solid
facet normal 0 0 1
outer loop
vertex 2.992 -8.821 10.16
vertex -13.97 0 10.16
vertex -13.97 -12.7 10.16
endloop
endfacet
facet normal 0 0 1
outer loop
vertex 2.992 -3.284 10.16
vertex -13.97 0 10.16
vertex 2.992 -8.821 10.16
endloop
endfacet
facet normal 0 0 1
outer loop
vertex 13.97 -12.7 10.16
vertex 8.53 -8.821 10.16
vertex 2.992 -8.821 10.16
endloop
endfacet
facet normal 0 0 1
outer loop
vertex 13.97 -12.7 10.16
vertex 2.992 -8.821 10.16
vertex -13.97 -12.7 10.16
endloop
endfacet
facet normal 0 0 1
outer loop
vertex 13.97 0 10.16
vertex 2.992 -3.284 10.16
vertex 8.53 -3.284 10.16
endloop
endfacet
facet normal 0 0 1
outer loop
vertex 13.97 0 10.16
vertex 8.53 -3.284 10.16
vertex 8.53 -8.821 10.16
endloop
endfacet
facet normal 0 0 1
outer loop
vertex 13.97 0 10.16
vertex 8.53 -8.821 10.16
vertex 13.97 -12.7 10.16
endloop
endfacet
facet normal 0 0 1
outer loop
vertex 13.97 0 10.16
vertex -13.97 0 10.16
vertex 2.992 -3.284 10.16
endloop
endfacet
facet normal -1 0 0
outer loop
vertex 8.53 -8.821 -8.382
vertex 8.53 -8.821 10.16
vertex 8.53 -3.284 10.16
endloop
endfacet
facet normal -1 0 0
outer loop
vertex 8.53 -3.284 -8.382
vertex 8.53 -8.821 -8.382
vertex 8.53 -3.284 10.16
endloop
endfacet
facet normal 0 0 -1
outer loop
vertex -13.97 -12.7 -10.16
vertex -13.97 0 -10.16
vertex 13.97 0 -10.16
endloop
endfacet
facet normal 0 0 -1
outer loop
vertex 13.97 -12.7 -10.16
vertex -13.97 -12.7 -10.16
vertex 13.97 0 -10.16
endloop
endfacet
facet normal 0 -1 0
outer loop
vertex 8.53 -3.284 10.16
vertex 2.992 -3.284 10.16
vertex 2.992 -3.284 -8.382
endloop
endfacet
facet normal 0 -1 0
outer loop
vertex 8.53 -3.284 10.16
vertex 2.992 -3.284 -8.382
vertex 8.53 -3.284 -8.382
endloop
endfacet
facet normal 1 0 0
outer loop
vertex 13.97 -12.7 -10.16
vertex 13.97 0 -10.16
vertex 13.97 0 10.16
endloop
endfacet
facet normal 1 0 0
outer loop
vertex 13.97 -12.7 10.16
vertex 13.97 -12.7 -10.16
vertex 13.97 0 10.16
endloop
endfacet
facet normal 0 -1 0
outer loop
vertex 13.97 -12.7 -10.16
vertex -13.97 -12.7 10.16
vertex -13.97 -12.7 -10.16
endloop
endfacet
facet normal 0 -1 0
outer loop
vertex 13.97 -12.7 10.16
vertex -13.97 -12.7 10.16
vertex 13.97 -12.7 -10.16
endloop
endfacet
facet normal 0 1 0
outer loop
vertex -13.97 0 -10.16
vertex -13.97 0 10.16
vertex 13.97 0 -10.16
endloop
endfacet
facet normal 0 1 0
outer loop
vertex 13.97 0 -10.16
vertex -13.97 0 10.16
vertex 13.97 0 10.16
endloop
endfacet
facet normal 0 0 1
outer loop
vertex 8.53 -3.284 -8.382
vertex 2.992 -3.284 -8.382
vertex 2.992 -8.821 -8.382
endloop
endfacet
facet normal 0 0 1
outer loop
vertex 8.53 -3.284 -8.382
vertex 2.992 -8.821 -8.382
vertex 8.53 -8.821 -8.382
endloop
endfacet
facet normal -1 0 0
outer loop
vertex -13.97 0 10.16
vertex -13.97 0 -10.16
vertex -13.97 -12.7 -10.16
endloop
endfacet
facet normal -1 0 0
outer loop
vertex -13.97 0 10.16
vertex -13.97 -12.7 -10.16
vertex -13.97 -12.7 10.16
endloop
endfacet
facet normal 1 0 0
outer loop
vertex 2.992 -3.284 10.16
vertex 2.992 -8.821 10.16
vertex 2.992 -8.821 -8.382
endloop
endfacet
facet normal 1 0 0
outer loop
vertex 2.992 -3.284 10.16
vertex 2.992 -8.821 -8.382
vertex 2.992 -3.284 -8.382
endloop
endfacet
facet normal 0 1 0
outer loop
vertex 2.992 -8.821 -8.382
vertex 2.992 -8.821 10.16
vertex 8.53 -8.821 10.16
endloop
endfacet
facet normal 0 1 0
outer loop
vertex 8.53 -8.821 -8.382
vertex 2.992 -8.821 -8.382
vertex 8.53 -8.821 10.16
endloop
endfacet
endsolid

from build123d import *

# Parameters (mm, degrees)
F0_W     = 27.94
F0_H     = 20.32
F1_DEPTH = 12.7
F2_W     = 5.5372
F2_H     = 5.5372
F3_DEPTH = 18.542


# Not quite as in the source:
# - a feature names something its author has since deleted; it is built from what else it names


with BuildPart() as f1:
    # F0 (on Front) → F1 (new body)
    with BuildSketch(Plane.XZ):
        Rectangle(F0_W, F0_H)
    extrude(amount=F1_DEPTH)

    # F2 (on face) → F3 (cut)
    with BuildSketch(Plane.XY.offset(10.16)):
        with Locations((5.760986782, -6.0524168657)):
            Rectangle(F2_W, F2_H)
    extrude(amount=-F3_DEPTH, mode=Mode.SUBTRACT)


solid = f1.part
